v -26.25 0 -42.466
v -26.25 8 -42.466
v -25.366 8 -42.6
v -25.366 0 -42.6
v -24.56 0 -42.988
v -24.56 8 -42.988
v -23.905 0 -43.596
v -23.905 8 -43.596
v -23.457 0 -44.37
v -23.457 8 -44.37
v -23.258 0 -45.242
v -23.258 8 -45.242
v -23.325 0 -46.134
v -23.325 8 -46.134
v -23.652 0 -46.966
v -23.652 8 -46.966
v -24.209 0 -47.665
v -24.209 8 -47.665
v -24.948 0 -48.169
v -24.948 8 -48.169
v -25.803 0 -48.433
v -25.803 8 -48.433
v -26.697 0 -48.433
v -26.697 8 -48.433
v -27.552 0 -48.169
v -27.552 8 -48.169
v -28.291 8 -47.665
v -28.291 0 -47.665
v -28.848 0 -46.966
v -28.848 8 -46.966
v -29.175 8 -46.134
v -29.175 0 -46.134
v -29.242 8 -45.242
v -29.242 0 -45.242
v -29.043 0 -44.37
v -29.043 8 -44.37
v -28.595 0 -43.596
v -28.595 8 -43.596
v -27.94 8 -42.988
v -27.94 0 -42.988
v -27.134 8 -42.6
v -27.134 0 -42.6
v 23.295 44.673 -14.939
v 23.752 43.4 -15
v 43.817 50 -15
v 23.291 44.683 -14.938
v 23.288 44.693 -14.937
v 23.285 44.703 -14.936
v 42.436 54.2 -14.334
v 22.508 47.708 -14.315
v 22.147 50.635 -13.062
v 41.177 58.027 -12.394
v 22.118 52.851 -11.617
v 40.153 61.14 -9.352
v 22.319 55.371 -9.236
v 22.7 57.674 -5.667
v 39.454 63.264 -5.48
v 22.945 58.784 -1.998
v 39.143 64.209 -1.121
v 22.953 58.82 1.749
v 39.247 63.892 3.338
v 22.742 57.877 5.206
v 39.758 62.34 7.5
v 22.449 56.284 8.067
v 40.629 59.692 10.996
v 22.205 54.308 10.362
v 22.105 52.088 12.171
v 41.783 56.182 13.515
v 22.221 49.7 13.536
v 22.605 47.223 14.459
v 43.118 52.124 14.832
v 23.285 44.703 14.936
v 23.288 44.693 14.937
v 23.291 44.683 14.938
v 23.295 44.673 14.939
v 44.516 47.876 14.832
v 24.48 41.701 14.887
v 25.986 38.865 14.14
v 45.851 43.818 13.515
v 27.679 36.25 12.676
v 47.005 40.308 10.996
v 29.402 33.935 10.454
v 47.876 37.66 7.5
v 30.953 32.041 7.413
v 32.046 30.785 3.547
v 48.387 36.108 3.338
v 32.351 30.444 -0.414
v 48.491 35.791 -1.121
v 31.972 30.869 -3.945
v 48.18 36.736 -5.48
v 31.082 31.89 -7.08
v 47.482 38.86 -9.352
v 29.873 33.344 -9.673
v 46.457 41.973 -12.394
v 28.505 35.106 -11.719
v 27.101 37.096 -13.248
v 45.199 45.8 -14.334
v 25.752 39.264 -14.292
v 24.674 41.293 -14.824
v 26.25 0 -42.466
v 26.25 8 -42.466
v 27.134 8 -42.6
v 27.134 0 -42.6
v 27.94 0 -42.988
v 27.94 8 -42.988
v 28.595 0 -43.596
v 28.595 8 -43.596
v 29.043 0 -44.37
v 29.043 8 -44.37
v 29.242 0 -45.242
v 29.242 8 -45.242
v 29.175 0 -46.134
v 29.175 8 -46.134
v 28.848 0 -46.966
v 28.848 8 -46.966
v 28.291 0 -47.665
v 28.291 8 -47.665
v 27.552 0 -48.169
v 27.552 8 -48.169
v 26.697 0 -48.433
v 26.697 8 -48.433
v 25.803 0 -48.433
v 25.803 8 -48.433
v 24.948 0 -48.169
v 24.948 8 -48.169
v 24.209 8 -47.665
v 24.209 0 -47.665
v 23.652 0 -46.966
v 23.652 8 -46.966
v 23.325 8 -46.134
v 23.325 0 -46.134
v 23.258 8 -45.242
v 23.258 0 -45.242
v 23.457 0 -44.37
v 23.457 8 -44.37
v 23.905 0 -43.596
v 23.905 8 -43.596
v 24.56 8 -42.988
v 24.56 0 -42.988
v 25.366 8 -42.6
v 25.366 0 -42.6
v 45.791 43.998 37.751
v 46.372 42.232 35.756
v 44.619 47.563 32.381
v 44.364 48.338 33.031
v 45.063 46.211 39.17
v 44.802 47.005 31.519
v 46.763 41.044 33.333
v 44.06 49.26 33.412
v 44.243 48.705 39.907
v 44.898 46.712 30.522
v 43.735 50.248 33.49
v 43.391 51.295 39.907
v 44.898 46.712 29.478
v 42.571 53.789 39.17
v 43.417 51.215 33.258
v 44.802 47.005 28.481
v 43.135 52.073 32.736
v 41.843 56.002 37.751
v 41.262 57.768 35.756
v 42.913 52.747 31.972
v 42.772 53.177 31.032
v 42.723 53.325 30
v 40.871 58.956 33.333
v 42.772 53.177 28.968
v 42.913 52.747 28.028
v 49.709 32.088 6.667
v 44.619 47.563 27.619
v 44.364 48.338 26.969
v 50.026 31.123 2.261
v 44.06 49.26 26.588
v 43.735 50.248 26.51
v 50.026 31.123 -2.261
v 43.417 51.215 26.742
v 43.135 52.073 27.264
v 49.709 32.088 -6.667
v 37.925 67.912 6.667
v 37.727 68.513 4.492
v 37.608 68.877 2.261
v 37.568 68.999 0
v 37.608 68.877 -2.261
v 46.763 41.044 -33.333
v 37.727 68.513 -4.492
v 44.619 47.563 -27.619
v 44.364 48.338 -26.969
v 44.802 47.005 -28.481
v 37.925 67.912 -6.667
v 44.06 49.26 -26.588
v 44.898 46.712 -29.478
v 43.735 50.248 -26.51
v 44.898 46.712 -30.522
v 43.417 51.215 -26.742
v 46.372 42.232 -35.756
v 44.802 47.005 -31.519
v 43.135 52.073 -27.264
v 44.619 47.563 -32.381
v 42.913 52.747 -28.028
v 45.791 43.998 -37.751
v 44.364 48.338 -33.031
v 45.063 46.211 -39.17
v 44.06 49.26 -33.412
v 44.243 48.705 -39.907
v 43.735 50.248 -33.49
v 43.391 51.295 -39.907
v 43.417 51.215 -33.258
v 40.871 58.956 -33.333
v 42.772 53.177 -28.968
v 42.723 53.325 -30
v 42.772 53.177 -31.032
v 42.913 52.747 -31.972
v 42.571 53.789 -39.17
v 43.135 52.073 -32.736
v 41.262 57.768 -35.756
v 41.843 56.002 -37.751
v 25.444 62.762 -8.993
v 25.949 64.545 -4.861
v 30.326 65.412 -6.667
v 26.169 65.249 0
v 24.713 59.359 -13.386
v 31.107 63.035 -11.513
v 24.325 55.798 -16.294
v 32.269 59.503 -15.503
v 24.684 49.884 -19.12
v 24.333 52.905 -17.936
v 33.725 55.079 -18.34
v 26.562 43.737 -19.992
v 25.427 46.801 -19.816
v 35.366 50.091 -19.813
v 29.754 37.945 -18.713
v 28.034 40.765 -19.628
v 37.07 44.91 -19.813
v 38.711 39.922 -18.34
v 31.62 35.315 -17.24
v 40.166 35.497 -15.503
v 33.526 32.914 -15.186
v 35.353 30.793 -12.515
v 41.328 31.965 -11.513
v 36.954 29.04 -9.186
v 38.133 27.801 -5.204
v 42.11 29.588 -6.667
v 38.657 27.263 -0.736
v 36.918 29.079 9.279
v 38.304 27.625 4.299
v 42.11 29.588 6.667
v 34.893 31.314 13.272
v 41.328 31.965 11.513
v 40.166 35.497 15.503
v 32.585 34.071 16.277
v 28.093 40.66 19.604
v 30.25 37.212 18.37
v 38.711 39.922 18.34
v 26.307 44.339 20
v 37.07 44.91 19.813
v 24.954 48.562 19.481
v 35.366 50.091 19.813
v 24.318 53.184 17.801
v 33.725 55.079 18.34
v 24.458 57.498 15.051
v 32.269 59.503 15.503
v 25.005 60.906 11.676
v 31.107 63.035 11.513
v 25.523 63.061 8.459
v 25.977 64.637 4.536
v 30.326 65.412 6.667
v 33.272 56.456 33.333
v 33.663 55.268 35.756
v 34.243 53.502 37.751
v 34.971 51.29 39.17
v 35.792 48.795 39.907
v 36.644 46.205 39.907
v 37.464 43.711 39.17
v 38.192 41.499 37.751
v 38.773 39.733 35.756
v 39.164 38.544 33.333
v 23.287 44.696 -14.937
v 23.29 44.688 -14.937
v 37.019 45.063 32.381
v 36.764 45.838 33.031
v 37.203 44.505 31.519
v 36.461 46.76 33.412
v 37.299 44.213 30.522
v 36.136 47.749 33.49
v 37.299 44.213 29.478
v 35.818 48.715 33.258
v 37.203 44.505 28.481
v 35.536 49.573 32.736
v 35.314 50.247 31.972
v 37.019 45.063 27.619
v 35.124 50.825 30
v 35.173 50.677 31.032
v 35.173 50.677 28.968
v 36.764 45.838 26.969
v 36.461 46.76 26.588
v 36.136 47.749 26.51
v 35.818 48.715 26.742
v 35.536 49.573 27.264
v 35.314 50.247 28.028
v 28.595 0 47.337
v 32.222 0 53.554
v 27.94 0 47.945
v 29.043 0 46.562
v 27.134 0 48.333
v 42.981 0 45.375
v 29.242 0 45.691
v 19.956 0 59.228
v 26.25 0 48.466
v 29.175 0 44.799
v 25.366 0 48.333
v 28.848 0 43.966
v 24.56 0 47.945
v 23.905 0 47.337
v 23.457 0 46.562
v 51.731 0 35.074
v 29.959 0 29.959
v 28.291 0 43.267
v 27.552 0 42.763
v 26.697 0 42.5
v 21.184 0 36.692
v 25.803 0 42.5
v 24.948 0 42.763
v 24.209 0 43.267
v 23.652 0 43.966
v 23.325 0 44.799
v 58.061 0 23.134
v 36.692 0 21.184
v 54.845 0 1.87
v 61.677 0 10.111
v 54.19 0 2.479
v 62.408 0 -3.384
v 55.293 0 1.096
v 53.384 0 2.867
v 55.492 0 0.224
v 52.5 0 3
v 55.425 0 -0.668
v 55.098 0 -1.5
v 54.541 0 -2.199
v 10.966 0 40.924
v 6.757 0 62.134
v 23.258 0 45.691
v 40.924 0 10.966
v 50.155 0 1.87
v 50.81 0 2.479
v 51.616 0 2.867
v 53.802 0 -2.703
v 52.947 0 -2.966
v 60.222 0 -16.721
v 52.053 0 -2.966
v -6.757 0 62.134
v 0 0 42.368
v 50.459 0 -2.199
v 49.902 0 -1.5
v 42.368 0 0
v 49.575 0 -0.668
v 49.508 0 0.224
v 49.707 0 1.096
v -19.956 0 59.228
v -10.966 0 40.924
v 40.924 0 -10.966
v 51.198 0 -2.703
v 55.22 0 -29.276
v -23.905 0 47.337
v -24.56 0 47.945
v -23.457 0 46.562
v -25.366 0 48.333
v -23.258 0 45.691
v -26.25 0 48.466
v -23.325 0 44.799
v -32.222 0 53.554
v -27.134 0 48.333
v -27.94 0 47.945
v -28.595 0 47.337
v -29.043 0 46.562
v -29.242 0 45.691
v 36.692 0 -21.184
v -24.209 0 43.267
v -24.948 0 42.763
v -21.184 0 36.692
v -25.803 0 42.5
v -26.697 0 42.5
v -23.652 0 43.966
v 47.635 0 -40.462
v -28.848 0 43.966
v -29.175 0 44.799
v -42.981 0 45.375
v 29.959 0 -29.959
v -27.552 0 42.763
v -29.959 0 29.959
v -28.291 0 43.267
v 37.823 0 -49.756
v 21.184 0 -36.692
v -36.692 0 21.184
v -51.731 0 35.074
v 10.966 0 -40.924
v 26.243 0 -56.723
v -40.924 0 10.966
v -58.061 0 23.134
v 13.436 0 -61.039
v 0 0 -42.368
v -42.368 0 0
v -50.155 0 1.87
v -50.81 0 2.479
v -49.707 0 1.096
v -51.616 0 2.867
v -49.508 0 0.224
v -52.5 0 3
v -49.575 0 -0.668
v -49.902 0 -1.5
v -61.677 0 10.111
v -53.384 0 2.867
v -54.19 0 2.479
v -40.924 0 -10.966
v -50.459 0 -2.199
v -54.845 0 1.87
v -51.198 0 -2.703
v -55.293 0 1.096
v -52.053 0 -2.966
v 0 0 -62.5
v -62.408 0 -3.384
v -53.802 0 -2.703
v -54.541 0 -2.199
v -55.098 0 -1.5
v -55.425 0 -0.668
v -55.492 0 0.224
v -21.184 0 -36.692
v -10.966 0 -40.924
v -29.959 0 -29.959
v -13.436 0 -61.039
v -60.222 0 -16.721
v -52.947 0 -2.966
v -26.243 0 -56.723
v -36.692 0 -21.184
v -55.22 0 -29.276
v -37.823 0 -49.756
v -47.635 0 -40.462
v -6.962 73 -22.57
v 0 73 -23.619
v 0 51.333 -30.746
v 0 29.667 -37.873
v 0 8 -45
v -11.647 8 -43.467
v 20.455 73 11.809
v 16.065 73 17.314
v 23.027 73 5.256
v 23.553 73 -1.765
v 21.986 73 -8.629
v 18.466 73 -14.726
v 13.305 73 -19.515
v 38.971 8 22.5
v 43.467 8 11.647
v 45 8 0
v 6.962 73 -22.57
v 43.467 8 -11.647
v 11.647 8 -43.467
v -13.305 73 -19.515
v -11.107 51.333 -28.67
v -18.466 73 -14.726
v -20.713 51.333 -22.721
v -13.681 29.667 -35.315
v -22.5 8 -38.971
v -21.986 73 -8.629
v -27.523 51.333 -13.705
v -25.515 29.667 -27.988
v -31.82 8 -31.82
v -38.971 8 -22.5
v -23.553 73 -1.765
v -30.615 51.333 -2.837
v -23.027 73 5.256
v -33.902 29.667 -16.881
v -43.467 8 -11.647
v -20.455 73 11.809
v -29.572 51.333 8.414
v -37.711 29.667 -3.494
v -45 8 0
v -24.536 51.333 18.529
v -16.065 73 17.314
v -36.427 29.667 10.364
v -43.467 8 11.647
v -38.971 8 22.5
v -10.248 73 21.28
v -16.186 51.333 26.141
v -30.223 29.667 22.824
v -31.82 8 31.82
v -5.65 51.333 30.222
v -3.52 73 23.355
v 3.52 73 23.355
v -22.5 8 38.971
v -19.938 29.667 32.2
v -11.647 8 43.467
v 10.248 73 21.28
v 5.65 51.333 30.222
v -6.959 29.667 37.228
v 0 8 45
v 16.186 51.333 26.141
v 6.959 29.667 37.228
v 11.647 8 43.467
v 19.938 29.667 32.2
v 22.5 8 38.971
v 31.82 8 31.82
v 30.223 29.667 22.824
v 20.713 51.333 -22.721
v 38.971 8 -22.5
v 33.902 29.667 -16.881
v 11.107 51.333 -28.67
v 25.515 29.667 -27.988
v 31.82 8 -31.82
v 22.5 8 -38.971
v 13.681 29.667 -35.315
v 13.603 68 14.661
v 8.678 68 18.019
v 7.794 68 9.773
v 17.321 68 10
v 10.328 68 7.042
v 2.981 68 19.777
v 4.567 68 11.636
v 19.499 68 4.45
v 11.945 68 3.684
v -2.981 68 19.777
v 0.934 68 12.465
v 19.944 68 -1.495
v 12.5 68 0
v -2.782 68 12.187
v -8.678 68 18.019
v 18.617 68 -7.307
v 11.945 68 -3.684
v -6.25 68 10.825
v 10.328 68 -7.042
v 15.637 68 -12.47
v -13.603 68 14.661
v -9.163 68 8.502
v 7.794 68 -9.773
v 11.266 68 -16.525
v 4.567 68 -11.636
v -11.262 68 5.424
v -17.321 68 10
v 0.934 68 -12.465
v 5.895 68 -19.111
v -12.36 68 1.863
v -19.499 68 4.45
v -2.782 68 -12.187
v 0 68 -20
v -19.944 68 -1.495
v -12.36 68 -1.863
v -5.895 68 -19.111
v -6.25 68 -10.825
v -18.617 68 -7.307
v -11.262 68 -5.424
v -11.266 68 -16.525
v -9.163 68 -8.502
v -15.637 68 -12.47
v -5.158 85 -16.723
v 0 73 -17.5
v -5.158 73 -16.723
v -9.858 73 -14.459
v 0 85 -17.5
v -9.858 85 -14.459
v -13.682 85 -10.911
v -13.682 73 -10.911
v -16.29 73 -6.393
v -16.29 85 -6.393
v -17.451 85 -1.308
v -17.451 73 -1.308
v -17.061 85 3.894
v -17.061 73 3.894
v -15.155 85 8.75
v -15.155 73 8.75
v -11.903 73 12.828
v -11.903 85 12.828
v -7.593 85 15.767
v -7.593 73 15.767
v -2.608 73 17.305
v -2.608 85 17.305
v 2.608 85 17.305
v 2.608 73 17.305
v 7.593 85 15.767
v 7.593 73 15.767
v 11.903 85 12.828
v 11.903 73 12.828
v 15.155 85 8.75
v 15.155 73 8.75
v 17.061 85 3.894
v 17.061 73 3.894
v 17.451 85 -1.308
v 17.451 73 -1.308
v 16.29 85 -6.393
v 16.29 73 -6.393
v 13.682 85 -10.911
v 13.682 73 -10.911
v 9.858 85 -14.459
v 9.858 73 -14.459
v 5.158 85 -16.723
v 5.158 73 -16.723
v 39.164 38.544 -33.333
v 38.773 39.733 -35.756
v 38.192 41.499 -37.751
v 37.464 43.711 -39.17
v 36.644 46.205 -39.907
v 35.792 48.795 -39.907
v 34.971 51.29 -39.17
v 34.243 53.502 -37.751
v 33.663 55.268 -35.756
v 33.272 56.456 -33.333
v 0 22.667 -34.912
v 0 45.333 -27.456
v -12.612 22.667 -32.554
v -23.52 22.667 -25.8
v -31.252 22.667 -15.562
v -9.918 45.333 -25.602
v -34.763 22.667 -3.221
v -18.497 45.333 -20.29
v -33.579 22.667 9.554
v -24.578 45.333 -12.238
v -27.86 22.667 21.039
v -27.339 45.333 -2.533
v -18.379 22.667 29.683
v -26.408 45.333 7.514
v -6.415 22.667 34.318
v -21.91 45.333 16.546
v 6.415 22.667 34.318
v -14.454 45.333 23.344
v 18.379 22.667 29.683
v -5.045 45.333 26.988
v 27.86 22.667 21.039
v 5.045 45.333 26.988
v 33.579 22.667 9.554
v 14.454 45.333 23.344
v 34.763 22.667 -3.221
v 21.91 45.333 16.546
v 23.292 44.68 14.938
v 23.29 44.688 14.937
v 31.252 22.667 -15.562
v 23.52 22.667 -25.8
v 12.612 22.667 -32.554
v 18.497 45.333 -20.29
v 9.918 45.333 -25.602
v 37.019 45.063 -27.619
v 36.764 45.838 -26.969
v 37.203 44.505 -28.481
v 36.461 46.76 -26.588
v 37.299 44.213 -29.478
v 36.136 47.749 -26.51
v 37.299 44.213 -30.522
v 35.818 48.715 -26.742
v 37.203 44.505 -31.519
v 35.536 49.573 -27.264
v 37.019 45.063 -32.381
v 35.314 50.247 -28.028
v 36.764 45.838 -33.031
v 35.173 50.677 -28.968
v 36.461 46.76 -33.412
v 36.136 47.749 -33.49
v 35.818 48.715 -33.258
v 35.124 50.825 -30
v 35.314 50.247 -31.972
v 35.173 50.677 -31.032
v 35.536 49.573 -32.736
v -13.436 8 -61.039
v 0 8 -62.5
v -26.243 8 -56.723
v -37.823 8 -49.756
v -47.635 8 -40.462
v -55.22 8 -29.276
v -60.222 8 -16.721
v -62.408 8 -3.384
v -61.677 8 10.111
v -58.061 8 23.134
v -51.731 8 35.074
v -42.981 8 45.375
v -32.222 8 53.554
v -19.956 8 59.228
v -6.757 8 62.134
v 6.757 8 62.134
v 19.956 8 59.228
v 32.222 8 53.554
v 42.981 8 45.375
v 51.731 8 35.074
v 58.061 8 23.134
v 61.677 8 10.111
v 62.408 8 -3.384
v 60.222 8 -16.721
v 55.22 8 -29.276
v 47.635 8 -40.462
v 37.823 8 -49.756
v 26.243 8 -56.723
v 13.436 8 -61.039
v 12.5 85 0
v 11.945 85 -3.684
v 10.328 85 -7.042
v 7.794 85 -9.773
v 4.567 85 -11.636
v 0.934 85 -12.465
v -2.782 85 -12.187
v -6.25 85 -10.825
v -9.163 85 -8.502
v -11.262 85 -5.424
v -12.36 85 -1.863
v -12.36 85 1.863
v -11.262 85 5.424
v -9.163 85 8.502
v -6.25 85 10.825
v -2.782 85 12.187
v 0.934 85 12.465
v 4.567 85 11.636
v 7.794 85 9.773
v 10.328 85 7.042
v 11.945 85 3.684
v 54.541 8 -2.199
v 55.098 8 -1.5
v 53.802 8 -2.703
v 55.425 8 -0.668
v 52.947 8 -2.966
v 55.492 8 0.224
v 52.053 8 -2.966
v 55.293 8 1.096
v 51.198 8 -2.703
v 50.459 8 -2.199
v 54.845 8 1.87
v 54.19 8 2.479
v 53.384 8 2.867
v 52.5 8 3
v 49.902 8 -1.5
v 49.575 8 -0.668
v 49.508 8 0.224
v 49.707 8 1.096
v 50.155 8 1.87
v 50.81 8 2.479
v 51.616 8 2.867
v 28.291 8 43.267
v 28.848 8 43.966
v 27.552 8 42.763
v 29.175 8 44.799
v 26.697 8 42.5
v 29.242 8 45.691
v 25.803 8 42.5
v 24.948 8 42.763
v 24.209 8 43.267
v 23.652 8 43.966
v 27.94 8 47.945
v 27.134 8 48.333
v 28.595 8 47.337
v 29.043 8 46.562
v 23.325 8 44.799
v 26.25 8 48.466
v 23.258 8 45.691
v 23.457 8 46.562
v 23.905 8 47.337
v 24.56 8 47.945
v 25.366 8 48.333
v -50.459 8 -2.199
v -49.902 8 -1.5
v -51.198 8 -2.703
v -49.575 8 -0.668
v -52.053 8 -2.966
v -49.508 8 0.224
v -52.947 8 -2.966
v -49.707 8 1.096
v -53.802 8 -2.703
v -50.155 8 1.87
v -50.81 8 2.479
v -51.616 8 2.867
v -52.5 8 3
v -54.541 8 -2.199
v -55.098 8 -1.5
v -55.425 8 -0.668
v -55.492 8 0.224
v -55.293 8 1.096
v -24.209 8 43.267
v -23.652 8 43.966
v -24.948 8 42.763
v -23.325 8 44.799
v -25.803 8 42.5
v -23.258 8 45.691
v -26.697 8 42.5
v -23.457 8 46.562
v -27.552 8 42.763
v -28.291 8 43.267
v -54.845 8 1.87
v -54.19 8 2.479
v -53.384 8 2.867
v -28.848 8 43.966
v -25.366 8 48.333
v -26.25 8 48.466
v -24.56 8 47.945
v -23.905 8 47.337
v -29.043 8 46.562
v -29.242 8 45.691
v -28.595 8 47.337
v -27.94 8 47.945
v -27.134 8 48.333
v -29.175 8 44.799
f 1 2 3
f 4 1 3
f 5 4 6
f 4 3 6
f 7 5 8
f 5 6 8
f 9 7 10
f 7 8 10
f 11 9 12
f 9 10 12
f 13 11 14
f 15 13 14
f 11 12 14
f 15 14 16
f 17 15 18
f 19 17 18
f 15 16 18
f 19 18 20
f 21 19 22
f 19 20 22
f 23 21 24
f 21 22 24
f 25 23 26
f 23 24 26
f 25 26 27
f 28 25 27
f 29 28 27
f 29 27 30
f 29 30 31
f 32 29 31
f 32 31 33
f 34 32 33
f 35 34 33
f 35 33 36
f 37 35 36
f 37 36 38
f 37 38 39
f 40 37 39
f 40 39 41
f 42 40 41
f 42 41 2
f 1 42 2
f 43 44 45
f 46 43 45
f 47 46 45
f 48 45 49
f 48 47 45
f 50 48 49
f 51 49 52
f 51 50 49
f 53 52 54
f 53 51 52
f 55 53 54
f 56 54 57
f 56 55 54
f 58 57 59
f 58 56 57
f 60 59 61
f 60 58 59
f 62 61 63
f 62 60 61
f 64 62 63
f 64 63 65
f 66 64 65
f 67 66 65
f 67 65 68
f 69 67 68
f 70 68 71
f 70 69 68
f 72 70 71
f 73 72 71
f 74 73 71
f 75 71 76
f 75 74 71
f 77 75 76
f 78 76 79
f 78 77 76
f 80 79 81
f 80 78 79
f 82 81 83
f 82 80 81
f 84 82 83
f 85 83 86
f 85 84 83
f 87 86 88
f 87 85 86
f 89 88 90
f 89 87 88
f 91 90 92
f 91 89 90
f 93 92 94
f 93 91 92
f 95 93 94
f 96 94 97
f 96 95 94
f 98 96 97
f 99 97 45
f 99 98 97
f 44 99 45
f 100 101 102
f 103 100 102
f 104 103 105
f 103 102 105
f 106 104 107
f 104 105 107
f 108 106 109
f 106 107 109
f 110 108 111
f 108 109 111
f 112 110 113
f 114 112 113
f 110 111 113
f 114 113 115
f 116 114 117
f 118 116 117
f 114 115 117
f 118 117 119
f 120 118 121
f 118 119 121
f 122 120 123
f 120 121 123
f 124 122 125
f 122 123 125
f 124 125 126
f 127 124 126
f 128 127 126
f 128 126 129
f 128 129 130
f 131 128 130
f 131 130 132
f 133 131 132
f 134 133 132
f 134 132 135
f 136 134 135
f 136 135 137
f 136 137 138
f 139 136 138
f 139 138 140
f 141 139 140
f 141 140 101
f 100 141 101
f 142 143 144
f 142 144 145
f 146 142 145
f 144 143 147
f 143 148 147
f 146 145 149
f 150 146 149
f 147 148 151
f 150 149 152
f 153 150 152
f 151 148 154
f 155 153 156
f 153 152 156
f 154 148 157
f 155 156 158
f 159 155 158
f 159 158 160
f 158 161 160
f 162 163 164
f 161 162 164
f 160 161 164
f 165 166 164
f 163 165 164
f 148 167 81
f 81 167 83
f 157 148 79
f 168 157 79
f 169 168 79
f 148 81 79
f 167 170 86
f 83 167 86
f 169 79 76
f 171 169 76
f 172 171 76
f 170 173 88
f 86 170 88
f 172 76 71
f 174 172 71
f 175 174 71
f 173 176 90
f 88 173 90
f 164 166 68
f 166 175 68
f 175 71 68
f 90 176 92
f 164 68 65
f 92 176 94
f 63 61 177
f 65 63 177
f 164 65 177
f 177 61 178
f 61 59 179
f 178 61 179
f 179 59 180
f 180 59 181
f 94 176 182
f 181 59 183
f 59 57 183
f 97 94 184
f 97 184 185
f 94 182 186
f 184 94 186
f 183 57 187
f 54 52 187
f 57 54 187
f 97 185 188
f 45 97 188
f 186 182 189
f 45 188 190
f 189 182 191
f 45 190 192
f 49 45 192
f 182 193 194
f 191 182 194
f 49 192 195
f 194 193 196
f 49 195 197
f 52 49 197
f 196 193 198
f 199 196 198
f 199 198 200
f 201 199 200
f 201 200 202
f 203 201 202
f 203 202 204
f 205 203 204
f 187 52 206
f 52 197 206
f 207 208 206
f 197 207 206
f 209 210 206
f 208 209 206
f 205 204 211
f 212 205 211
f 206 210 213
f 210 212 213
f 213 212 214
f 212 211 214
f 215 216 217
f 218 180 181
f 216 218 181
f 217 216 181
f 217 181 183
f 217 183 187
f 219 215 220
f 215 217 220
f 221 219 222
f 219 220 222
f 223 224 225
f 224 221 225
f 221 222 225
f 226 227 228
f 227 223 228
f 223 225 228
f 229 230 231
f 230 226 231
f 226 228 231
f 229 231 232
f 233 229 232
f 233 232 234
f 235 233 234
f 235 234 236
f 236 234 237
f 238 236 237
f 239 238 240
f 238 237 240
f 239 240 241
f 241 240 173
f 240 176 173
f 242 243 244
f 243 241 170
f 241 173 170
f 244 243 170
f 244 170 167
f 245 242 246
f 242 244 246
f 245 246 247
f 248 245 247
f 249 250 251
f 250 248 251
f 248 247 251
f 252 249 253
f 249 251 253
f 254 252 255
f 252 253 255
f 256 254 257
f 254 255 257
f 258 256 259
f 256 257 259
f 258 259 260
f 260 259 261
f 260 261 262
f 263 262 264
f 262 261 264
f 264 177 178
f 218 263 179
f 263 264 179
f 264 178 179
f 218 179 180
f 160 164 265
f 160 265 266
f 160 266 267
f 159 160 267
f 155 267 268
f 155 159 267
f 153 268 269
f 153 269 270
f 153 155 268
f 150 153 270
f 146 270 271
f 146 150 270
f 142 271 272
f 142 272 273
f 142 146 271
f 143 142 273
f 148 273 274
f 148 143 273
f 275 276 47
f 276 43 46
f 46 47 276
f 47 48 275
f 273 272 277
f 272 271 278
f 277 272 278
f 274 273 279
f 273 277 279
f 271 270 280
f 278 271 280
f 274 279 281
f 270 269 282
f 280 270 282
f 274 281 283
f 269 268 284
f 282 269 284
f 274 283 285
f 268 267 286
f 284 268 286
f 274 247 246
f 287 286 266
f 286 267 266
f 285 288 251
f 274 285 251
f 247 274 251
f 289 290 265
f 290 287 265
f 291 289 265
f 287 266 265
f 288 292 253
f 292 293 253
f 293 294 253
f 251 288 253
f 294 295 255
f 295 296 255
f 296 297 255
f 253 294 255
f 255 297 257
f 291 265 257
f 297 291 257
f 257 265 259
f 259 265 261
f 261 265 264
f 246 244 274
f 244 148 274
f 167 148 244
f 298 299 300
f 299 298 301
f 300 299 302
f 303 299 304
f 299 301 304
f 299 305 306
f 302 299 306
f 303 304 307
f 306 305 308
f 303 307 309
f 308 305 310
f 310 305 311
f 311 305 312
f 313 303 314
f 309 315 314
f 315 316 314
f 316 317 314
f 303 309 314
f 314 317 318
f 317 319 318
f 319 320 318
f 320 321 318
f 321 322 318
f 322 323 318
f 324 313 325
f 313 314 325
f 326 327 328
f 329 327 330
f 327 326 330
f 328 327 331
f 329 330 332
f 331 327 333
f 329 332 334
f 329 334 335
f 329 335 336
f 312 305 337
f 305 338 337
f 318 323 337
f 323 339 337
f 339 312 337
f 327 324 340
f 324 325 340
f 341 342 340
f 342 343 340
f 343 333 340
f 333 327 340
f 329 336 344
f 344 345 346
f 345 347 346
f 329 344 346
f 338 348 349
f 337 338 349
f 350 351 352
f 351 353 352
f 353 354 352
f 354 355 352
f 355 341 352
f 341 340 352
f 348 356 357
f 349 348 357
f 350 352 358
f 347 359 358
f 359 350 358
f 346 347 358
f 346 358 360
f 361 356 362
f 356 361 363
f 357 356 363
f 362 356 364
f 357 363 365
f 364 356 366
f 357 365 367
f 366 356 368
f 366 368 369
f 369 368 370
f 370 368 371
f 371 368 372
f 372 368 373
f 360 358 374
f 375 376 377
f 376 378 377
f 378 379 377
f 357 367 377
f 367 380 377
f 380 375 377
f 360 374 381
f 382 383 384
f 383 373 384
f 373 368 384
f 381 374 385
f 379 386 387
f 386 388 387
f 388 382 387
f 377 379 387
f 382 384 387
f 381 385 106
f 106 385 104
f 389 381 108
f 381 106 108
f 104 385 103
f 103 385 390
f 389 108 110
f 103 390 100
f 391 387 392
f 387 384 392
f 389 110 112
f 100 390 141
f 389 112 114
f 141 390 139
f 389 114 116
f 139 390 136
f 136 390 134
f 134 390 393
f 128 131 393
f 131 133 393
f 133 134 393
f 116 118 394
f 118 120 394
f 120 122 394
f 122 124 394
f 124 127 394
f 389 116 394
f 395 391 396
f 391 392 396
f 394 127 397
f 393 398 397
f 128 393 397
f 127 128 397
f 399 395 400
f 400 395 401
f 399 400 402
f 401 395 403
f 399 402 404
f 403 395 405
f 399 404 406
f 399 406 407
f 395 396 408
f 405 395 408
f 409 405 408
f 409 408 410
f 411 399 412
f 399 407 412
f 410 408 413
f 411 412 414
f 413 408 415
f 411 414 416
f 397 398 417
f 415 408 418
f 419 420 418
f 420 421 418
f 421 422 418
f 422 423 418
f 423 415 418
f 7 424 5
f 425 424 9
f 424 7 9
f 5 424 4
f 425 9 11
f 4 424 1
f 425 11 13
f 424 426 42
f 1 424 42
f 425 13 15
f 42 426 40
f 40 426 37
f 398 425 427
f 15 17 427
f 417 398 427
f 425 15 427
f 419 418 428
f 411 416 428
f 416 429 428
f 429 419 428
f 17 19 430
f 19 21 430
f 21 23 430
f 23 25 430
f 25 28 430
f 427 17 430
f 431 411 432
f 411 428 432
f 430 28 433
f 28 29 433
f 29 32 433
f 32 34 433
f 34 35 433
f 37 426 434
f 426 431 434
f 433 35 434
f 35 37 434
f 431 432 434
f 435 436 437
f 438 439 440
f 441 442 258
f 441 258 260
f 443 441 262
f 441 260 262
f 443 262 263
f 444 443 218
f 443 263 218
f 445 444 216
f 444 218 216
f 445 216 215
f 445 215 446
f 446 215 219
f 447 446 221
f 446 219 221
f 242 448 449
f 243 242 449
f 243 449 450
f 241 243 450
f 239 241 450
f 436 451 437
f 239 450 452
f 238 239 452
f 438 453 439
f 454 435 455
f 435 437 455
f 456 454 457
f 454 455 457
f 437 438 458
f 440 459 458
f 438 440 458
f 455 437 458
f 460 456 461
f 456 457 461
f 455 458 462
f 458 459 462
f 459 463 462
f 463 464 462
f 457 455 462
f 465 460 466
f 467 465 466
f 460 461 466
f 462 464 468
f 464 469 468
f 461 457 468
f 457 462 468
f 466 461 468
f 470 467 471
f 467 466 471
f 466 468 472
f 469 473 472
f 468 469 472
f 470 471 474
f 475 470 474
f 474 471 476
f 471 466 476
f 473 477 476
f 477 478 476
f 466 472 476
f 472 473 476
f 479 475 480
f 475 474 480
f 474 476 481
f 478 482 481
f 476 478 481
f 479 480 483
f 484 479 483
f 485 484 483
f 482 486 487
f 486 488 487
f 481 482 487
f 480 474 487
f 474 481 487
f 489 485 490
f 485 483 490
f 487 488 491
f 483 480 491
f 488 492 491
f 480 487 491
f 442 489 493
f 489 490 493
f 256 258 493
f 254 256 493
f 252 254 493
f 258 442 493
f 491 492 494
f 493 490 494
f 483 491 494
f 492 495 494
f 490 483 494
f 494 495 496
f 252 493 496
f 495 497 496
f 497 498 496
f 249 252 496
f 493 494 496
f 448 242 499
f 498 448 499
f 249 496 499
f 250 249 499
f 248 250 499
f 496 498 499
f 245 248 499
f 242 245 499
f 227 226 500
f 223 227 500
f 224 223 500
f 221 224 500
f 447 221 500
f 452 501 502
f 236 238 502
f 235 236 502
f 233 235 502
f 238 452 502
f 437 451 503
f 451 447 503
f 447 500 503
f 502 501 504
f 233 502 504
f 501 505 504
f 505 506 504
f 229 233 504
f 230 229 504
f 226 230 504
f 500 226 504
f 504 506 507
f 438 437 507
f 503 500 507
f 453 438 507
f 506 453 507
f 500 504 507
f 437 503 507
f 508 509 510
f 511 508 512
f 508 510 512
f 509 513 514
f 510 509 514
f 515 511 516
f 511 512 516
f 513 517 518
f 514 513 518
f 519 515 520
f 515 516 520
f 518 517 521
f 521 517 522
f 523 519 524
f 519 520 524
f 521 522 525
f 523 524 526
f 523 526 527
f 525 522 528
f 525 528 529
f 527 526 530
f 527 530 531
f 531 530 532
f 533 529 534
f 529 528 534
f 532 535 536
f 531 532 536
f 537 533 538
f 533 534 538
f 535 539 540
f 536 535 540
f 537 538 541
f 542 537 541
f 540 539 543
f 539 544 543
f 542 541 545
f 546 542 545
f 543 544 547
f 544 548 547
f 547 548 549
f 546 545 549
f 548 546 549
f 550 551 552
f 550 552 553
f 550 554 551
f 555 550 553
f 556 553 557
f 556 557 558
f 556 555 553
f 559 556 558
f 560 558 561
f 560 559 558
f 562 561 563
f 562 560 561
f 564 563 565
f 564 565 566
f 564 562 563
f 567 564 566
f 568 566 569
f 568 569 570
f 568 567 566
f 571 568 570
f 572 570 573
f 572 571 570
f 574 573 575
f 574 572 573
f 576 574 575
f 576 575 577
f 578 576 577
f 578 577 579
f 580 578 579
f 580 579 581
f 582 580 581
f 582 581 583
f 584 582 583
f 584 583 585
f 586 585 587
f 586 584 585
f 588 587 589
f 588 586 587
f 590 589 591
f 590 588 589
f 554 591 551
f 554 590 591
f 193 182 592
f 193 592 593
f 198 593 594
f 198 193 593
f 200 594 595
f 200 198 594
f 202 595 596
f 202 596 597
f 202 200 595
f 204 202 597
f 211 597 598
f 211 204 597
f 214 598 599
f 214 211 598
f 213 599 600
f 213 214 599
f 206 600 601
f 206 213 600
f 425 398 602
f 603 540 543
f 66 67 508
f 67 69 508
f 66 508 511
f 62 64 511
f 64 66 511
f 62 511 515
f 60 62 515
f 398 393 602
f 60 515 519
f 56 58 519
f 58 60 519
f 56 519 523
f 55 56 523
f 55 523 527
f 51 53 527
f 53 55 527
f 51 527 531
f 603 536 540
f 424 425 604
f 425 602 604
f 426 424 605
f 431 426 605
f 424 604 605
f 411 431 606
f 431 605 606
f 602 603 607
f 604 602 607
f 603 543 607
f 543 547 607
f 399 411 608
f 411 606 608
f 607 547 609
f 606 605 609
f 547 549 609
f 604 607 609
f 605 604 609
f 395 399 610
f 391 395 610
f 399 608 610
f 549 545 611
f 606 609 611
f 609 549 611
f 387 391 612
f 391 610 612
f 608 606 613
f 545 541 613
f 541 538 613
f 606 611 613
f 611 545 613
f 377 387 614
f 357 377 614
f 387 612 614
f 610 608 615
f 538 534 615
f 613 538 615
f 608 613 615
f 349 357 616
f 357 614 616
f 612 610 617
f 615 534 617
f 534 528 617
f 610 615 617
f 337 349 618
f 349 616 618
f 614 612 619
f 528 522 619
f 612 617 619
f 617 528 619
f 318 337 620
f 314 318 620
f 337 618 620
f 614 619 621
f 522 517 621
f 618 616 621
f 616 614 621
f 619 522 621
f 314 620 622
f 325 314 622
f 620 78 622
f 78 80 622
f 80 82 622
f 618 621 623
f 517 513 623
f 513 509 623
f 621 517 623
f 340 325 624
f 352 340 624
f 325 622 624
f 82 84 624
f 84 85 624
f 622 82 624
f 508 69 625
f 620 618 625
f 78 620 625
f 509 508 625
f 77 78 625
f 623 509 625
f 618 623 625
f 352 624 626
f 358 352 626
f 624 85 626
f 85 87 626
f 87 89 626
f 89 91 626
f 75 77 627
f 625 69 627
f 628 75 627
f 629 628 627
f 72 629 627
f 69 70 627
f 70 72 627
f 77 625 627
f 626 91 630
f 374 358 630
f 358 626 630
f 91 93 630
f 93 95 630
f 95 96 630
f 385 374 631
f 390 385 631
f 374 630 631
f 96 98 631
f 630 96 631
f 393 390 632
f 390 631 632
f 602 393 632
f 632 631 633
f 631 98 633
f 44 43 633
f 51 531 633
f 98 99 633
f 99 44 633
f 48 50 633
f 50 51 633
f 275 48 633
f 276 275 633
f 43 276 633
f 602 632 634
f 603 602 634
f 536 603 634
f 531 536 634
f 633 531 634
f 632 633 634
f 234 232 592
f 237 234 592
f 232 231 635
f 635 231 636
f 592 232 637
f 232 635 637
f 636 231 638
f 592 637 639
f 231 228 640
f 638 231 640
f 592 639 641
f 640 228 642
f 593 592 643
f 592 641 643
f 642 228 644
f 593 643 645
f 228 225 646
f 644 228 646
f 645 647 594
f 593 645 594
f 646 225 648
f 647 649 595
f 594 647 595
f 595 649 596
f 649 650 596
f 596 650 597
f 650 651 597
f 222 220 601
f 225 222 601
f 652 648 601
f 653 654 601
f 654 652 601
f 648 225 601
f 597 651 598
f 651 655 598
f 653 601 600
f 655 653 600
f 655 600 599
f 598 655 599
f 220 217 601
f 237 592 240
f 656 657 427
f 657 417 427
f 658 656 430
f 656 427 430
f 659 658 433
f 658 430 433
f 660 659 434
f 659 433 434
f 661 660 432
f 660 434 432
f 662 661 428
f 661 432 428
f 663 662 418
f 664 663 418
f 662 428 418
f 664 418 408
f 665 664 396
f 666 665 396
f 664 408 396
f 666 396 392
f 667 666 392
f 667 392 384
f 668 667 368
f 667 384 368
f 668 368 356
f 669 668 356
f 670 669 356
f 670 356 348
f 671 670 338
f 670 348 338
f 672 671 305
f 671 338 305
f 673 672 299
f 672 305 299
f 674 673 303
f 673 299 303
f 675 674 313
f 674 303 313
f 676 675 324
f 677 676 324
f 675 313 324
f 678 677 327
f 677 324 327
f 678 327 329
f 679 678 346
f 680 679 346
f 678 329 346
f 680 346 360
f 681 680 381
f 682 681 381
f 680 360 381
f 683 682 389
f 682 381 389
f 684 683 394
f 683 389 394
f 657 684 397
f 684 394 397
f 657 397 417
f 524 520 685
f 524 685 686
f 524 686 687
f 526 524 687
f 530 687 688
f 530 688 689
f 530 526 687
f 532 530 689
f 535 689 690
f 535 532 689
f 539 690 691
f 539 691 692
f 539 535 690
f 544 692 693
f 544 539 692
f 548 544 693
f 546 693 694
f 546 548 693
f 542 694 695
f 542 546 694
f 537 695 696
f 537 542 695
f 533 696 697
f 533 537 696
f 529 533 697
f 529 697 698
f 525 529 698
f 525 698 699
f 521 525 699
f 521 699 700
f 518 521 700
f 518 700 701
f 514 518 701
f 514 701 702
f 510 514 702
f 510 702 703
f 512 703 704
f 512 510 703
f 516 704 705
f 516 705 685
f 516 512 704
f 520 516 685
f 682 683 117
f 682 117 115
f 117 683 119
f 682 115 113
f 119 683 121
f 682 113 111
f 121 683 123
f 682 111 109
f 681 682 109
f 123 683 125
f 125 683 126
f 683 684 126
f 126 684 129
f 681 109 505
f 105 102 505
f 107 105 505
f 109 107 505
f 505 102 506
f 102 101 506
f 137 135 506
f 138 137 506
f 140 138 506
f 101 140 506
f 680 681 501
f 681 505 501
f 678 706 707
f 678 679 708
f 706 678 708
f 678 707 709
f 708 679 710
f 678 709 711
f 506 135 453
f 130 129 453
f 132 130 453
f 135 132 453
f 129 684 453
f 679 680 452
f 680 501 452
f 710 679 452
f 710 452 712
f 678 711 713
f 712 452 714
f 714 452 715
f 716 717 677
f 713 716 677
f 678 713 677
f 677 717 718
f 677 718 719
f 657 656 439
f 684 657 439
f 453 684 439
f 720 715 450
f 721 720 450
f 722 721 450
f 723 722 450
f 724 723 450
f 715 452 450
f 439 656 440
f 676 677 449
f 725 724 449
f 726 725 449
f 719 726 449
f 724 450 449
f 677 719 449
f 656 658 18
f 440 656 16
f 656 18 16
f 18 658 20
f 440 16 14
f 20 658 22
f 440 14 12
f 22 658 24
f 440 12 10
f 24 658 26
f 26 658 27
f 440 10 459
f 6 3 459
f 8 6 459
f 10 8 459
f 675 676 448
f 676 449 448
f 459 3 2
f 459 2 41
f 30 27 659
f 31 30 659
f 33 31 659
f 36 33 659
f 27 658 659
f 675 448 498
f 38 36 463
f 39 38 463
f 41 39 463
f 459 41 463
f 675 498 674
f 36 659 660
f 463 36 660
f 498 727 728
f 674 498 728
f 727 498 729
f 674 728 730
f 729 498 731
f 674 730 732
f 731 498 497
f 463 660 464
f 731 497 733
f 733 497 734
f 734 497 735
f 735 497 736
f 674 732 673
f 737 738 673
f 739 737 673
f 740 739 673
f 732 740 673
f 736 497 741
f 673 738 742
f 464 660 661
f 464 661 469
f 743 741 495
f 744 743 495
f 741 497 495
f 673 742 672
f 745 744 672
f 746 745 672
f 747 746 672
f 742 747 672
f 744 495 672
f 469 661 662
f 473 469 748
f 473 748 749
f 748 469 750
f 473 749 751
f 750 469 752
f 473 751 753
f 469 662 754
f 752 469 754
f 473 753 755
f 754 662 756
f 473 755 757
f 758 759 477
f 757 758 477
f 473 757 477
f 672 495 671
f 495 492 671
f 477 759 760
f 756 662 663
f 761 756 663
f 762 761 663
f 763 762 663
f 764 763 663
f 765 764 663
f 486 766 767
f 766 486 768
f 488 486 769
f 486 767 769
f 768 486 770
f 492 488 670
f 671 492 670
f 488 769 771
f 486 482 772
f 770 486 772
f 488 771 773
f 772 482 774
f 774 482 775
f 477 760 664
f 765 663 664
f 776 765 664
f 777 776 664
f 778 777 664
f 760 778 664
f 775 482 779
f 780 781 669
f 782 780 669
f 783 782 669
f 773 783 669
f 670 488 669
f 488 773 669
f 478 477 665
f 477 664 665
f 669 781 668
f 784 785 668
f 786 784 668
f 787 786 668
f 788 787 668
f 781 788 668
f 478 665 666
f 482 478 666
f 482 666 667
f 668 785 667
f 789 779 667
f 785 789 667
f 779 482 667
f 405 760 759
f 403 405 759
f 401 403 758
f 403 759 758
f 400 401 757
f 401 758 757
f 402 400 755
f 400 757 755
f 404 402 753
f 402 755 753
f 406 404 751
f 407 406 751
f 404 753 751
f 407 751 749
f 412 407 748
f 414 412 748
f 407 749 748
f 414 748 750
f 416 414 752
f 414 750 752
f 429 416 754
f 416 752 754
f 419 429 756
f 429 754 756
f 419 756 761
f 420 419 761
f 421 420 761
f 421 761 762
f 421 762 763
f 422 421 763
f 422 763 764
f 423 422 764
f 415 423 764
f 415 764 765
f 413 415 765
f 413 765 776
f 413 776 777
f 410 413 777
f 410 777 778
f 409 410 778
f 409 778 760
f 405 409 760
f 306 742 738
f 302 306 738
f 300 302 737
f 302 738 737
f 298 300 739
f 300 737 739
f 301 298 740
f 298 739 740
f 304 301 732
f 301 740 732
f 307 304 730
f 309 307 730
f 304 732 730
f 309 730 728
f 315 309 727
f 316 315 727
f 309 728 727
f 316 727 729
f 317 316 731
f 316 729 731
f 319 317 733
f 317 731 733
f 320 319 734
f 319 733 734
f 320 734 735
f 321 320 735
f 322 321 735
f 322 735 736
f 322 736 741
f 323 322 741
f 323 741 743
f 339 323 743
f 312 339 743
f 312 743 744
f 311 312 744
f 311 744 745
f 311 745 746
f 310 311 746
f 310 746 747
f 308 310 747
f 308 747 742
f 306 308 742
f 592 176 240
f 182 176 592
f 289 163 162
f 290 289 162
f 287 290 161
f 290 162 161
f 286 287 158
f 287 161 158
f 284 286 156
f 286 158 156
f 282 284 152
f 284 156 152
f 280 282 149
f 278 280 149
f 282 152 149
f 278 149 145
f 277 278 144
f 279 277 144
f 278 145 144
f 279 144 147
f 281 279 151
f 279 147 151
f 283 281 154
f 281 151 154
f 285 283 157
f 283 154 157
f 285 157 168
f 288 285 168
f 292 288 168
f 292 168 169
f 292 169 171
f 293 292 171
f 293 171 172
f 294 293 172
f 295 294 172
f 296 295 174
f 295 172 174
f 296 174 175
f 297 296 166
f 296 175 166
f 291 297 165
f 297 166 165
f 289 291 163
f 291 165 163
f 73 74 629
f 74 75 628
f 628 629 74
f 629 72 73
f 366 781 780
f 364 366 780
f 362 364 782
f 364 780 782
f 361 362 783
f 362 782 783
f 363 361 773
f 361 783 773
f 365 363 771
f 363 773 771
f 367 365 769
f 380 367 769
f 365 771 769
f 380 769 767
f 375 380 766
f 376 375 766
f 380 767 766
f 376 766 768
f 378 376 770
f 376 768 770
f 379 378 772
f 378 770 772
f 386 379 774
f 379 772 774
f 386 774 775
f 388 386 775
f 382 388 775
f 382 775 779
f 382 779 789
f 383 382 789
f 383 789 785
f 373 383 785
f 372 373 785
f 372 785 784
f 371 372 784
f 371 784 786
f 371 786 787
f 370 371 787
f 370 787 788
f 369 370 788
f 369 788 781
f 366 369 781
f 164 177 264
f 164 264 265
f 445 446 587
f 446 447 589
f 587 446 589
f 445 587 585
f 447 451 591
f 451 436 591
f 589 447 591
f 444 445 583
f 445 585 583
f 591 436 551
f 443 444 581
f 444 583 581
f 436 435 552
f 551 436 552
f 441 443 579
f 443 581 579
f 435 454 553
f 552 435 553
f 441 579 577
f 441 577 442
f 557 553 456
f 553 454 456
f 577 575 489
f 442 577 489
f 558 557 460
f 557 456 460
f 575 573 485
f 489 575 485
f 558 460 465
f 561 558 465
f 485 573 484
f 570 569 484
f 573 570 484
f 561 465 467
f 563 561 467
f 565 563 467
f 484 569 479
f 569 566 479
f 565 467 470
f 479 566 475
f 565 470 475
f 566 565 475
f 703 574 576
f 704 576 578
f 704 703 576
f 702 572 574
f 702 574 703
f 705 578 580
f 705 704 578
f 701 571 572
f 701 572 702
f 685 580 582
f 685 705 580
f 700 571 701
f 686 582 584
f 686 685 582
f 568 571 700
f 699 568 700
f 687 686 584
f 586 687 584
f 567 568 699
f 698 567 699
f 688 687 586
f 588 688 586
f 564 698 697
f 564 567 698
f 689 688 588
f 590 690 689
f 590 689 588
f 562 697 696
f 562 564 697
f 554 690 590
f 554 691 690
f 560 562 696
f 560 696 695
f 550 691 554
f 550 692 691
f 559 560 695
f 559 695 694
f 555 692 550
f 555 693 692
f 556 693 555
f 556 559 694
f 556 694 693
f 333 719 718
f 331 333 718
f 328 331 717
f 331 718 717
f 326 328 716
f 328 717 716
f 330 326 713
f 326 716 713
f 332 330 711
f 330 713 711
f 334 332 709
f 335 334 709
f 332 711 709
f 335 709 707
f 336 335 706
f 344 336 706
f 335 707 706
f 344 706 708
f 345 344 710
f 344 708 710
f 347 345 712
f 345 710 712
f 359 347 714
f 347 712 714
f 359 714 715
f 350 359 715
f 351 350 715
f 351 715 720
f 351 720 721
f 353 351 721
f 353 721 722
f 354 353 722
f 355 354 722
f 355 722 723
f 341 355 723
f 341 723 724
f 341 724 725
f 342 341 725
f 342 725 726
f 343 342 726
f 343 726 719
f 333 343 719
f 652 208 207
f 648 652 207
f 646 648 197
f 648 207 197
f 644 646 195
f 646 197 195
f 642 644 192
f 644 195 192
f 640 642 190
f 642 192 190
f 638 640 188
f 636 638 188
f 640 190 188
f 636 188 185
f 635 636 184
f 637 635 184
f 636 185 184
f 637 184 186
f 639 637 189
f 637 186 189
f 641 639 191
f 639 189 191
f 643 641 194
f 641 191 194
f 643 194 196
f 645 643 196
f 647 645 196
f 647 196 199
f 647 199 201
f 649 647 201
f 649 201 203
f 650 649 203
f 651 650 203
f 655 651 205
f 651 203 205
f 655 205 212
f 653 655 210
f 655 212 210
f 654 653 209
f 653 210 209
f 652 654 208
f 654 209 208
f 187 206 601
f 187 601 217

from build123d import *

# Parameters (mm, degrees)
SKETCH_4_W              = 17.5
SKETCH_4_H              = 11.999999999999986
SHELL_START             = 68
SHELL_1_OUTLINE_R       = 12.5
SHELL_1_DEPTH           = 17
EXTRUDE_2_REACH         = 143.612
SKETCH_7_R              = 19.99999999999999
SKETCH_8_R              = 3.500000000000001
EXTRUDE_3_DEPTH         = 8
CUT_EXTRUDE_START       = -21.159422762
CUT_EXTRUDE_1_OUTLINE_R = 15
CUT_EXTRUDE_1_DEPTH     = 21.159422762
CUT_EXTRUDE_2_REACH     = 119.224
SKETCH_9_R              = 3.0000000000000013
SKETCH_9_R_2            = 3.0000000000000018
SKETCH_9_R_3            = 2.9999999999999987
SKETCH_9_R_4            = 2.999999999999999


# Read off the part's stored shape, not the designer's step: 抽壳1, 切除-拉伸1
with BuildPart() as part:
    # 草图4 → 旋转1 (revolve)
    with BuildSketch(Plane.XY, mode=Mode.PRIVATE) as revolve_1_sk:
        with Locations((-8.75, 79)):
            Rectangle(SKETCH_4_W, SKETCH_4_H)
        Polygon((-62.5, 8), (-62.5, 0), (-42.367966888227485, 0), (-19.99999999999999, 67.99999999999997), (0, 67.99999999999997), (0, 73.00000000000001), (-17.5, 73.00000000000001), (-23.618855180370783, 73.00000000000001), (-45, 8), align=None)
    revolve(revolve_1_sk.sketch.rotate(Axis((0, 0, 0), (0, 1, 0)), 270), axis=Axis((0, 0, 0), (0, 1, 0)))

    # 抽壳1 outline → 抽壳1 (cut)
    with BuildSketch(Plane(origin=(0, 0, 0), x_dir=(1, 0, 0), z_dir=(0, 1, 0)).offset(SHELL_START)):
        Circle(SHELL_1_OUTLINE_R)
    extrude(amount=SHELL_1_DEPTH, mode=Mode.SUBTRACT)

    # 草图7 → 凸台-拉伸2 (add, up to next)
    with BuildSketch(Plane(origin=(42.98090645471225, 14.138169005955993, 0), x_dir=(0, 0, 1), z_dir=(-0.9499276731466783, -0.31246986381111624, 0)), mode=Mode.PRIVATE) as extrude_2_sk1:
        with Locations(Location((0, 33.804881714770495, 0), (0, 0, 90))):
            Circle(SKETCH_7_R)
    extrude_2_tool1 = extrude(extrude_2_sk1.sketch, amount=EXTRUDE_2_REACH, mode=Mode.PRIVATE) - part.part


with BuildPart() as body_2:
    # 草图6 → 旋转2 (revolve)
    with BuildSketch(Plane.XY):
        Polygon((32.417899669147, 46.25036163426662), (26.1685023929247, 65.24891509720017), (37.56763447068482, 68.99855346293356), (43.81703174690713, 50), align=None)
    revolve(axis=Axis((50.865675487969646, 52.31858573245586, 0), (-0.9499276731466784, -0.31246986381111624, 0)))


with BuildPart() as part_1:
    add(part.part)

    add(body_2.part)  # 凸台-拉伸2 merges body 2
    add(extrude_2_tool1.solids().sort_by_distance((32.4179, 46.250362, 0))[0])
    add(extrude_2_tool1.solids().sort_by_distance((32.4179, 46.250362, 0))[1])

    # 草图8 → 凸台-拉伸3 (add)
    # profile 1 of 2: a face of its own
    with BuildSketch(Plane(origin=(54.38003853247239, 17.88780737168939, 0), x_dir=(0, 0, -1), z_dir=(0.9499276731466783, 0.31246986381111624, 0))):
        with BuildLine():
            ThreePointArc((33.3333333333333, 24.37679227788569), (39.999999077050425, 33.804881714770474), (33.3333333333333, 43.23297115165526))
            Line((33.3333333333333, 43.23297115165526), (6.666667281966372, 52.66106232887043))
            ThreePointArc((6.666667281966377, 52.66106232887044), (16.329931806950803, 45.35188683213041), (19.99999999999999, 33.804881714770495))
            ThreePointArc((19.99999999999999, 33.80488171477049), (16.329931806950796, 22.257876597410572), (6.666667281966361, 14.948701100670544))
            Line((6.666667281966372, 14.948701100670537), (33.3333333333333, 24.376792277885695))
        make_face()
        with Locations(Location((30, 33.80488171477048, 0), (0, 0, 90))):
            Circle(SKETCH_8_R, mode=Mode.SUBTRACT)
    # profile 2 of 2: a face of its own
    with BuildSketch(Plane(origin=(54.38003853247239, 17.88780737168939, 0), x_dir=(0, 0, -1), z_dir=(0.9499276731466783, 0.31246986381111624, 0))):
        with BuildLine():
            ThreePointArc((-6.666667281966367, 14.948701100670544), (-19.99999999999999, 33.804881714770495), (-6.666667281966375, 52.66106232887044))
            Line((-6.666667281966372, 52.66106232887043), (-33.3333333333333, 43.23297115165526))
            ThreePointArc((-33.3333333333333, 43.23297115165526), (-39.999999077050425, 33.804881714770474), (-33.3333333333333, 24.37679227788569))
            Line((-33.3333333333333, 24.376792277885695), (-6.666667281966372, 14.948701100670537))
        make_face()
        with Locations(Location((-30, 33.80488171477048, 0), (0, 0, 90))):
            Circle(SKETCH_8_R, mode=Mode.SUBTRACT)
    extrude(amount=-EXTRUDE_3_DEPTH)

    # 切除-拉伸1 outline → 切除-拉伸1 (cut)
    with BuildSketch(Plane(origin=(54.38003853247239, 17.88780737168939, 0), x_dir=(0, 0, -1), z_dir=(0.9499276731466783, 0.31246986381111624, 0)).offset(CUT_EXTRUDE_START)):
        with Locations((0, 33.804881715)):
            Circle(CUT_EXTRUDE_1_OUTLINE_R)
    extrude(amount=CUT_EXTRUDE_1_DEPTH, mode=Mode.SUBTRACT)

    # 草图9 → 切除-拉伸2 (cut, up to next)
    with BuildSketch(Plane(origin=(0, 8, 0), x_dir=(1, 0, 0), z_dir=(0, 1, 0)), mode=Mode.PRIVATE) as cut_extrude_2_sk1:
        with Locations(Location((-52.5, 0, 0), (0, 0, 270))):
            Circle(SKETCH_9_R)
    cut_extrude_2_tool1 = extrude(cut_extrude_2_sk1.sketch, amount=-CUT_EXTRUDE_2_REACH, mode=Mode.PRIVATE) & part_1.part
    # 草图9 → 切除-拉伸2 (cut, up to next)
    with BuildSketch(Plane(origin=(0, 8, 0), x_dir=(1, 0, 0), z_dir=(0, 1, 0)), mode=Mode.PRIVATE) as cut_extrude_2_sk2:
        with Locations(Location((-26.249999999999893, 45.46633369868309, 0), (0, 0, 270))):
            Circle(SKETCH_9_R_2)
    cut_extrude_2_tool2 = extrude(cut_extrude_2_sk2.sketch, amount=-CUT_EXTRUDE_2_REACH, mode=Mode.PRIVATE) & part_1.part
    # 草图9 → 切除-拉伸2 (cut, up to next)
    with BuildSketch(Plane(origin=(0, 8, 0), x_dir=(1, 0, 0), z_dir=(0, 1, 0)), mode=Mode.PRIVATE) as cut_extrude_2_sk3:
        with Locations(Location((26.25000000000021, 45.46633369868293, 0), (0, 0, 270))):
            Circle(SKETCH_9_R)
    cut_extrude_2_tool3 = extrude(cut_extrude_2_sk3.sketch, amount=-CUT_EXTRUDE_2_REACH, mode=Mode.PRIVATE) & part_1.part
    # 草图9 → 切除-拉伸2 (cut, up to next)
    with BuildSketch(Plane(origin=(0, 8, 0), x_dir=(1, 0, 0), z_dir=(0, 1, 0)), mode=Mode.PRIVATE) as cut_extrude_2_sk4:
        with Locations(Location((52.5, -3.6661e-13, 0), (0, 0, 270))):
            Circle(SKETCH_9_R_2)
    cut_extrude_2_tool4 = extrude(cut_extrude_2_sk4.sketch, amount=-CUT_EXTRUDE_2_REACH, mode=Mode.PRIVATE) & part_1.part
    # 草图9 → 切除-拉伸2 (cut, up to next)
    with BuildSketch(Plane(origin=(0, 8, 0), x_dir=(1, 0, 0), z_dir=(0, 1, 0)), mode=Mode.PRIVATE) as cut_extrude_2_sk5:
        with Locations(Location((26.249999999999574, -45.46633369868327, 0), (0, 0, 270))):
            Circle(SKETCH_9_R_3)
    cut_extrude_2_tool5 = extrude(cut_extrude_2_sk5.sketch, amount=-CUT_EXTRUDE_2_REACH, mode=Mode.PRIVATE) & part_1.part
    # 草图9 → 切除-拉伸2 (cut, up to next)
    with BuildSketch(Plane(origin=(0, 8, 0), x_dir=(1, 0, 0), z_dir=(0, 1, 0)), mode=Mode.PRIVATE) as cut_extrude_2_sk6:
        with Locations(Location((-26.25000000000053, -45.46633369868272, 0), (0, 0, 270))):
            Circle(SKETCH_9_R_4)
    cut_extrude_2_tool6 = extrude(cut_extrude_2_sk6.sketch, amount=-CUT_EXTRUDE_2_REACH, mode=Mode.PRIVATE) & part_1.part
    add(cut_extrude_2_tool1.solids().sort_by_distance((-52.5, 8, 0))[0], mode=Mode.SUBTRACT)
    add(cut_extrude_2_tool2.solids().sort_by_distance((-26.25, 8, -45.466334))[0], mode=Mode.SUBTRACT)
    add(cut_extrude_2_tool3.solids().sort_by_distance((26.25, 8, -45.466334))[0], mode=Mode.SUBTRACT)
    add(cut_extrude_2_tool4.solids().sort_by_distance((52.5, 8, 0))[0], mode=Mode.SUBTRACT)
    add(cut_extrude_2_tool5.solids().sort_by_distance((26.25, 8, 45.466334))[0], mode=Mode.SUBTRACT)
    add(cut_extrude_2_tool6.solids().sort_by_distance((-26.25, 8, 45.466334))[0], mode=Mode.SUBTRACT)


solid = part_1.part
